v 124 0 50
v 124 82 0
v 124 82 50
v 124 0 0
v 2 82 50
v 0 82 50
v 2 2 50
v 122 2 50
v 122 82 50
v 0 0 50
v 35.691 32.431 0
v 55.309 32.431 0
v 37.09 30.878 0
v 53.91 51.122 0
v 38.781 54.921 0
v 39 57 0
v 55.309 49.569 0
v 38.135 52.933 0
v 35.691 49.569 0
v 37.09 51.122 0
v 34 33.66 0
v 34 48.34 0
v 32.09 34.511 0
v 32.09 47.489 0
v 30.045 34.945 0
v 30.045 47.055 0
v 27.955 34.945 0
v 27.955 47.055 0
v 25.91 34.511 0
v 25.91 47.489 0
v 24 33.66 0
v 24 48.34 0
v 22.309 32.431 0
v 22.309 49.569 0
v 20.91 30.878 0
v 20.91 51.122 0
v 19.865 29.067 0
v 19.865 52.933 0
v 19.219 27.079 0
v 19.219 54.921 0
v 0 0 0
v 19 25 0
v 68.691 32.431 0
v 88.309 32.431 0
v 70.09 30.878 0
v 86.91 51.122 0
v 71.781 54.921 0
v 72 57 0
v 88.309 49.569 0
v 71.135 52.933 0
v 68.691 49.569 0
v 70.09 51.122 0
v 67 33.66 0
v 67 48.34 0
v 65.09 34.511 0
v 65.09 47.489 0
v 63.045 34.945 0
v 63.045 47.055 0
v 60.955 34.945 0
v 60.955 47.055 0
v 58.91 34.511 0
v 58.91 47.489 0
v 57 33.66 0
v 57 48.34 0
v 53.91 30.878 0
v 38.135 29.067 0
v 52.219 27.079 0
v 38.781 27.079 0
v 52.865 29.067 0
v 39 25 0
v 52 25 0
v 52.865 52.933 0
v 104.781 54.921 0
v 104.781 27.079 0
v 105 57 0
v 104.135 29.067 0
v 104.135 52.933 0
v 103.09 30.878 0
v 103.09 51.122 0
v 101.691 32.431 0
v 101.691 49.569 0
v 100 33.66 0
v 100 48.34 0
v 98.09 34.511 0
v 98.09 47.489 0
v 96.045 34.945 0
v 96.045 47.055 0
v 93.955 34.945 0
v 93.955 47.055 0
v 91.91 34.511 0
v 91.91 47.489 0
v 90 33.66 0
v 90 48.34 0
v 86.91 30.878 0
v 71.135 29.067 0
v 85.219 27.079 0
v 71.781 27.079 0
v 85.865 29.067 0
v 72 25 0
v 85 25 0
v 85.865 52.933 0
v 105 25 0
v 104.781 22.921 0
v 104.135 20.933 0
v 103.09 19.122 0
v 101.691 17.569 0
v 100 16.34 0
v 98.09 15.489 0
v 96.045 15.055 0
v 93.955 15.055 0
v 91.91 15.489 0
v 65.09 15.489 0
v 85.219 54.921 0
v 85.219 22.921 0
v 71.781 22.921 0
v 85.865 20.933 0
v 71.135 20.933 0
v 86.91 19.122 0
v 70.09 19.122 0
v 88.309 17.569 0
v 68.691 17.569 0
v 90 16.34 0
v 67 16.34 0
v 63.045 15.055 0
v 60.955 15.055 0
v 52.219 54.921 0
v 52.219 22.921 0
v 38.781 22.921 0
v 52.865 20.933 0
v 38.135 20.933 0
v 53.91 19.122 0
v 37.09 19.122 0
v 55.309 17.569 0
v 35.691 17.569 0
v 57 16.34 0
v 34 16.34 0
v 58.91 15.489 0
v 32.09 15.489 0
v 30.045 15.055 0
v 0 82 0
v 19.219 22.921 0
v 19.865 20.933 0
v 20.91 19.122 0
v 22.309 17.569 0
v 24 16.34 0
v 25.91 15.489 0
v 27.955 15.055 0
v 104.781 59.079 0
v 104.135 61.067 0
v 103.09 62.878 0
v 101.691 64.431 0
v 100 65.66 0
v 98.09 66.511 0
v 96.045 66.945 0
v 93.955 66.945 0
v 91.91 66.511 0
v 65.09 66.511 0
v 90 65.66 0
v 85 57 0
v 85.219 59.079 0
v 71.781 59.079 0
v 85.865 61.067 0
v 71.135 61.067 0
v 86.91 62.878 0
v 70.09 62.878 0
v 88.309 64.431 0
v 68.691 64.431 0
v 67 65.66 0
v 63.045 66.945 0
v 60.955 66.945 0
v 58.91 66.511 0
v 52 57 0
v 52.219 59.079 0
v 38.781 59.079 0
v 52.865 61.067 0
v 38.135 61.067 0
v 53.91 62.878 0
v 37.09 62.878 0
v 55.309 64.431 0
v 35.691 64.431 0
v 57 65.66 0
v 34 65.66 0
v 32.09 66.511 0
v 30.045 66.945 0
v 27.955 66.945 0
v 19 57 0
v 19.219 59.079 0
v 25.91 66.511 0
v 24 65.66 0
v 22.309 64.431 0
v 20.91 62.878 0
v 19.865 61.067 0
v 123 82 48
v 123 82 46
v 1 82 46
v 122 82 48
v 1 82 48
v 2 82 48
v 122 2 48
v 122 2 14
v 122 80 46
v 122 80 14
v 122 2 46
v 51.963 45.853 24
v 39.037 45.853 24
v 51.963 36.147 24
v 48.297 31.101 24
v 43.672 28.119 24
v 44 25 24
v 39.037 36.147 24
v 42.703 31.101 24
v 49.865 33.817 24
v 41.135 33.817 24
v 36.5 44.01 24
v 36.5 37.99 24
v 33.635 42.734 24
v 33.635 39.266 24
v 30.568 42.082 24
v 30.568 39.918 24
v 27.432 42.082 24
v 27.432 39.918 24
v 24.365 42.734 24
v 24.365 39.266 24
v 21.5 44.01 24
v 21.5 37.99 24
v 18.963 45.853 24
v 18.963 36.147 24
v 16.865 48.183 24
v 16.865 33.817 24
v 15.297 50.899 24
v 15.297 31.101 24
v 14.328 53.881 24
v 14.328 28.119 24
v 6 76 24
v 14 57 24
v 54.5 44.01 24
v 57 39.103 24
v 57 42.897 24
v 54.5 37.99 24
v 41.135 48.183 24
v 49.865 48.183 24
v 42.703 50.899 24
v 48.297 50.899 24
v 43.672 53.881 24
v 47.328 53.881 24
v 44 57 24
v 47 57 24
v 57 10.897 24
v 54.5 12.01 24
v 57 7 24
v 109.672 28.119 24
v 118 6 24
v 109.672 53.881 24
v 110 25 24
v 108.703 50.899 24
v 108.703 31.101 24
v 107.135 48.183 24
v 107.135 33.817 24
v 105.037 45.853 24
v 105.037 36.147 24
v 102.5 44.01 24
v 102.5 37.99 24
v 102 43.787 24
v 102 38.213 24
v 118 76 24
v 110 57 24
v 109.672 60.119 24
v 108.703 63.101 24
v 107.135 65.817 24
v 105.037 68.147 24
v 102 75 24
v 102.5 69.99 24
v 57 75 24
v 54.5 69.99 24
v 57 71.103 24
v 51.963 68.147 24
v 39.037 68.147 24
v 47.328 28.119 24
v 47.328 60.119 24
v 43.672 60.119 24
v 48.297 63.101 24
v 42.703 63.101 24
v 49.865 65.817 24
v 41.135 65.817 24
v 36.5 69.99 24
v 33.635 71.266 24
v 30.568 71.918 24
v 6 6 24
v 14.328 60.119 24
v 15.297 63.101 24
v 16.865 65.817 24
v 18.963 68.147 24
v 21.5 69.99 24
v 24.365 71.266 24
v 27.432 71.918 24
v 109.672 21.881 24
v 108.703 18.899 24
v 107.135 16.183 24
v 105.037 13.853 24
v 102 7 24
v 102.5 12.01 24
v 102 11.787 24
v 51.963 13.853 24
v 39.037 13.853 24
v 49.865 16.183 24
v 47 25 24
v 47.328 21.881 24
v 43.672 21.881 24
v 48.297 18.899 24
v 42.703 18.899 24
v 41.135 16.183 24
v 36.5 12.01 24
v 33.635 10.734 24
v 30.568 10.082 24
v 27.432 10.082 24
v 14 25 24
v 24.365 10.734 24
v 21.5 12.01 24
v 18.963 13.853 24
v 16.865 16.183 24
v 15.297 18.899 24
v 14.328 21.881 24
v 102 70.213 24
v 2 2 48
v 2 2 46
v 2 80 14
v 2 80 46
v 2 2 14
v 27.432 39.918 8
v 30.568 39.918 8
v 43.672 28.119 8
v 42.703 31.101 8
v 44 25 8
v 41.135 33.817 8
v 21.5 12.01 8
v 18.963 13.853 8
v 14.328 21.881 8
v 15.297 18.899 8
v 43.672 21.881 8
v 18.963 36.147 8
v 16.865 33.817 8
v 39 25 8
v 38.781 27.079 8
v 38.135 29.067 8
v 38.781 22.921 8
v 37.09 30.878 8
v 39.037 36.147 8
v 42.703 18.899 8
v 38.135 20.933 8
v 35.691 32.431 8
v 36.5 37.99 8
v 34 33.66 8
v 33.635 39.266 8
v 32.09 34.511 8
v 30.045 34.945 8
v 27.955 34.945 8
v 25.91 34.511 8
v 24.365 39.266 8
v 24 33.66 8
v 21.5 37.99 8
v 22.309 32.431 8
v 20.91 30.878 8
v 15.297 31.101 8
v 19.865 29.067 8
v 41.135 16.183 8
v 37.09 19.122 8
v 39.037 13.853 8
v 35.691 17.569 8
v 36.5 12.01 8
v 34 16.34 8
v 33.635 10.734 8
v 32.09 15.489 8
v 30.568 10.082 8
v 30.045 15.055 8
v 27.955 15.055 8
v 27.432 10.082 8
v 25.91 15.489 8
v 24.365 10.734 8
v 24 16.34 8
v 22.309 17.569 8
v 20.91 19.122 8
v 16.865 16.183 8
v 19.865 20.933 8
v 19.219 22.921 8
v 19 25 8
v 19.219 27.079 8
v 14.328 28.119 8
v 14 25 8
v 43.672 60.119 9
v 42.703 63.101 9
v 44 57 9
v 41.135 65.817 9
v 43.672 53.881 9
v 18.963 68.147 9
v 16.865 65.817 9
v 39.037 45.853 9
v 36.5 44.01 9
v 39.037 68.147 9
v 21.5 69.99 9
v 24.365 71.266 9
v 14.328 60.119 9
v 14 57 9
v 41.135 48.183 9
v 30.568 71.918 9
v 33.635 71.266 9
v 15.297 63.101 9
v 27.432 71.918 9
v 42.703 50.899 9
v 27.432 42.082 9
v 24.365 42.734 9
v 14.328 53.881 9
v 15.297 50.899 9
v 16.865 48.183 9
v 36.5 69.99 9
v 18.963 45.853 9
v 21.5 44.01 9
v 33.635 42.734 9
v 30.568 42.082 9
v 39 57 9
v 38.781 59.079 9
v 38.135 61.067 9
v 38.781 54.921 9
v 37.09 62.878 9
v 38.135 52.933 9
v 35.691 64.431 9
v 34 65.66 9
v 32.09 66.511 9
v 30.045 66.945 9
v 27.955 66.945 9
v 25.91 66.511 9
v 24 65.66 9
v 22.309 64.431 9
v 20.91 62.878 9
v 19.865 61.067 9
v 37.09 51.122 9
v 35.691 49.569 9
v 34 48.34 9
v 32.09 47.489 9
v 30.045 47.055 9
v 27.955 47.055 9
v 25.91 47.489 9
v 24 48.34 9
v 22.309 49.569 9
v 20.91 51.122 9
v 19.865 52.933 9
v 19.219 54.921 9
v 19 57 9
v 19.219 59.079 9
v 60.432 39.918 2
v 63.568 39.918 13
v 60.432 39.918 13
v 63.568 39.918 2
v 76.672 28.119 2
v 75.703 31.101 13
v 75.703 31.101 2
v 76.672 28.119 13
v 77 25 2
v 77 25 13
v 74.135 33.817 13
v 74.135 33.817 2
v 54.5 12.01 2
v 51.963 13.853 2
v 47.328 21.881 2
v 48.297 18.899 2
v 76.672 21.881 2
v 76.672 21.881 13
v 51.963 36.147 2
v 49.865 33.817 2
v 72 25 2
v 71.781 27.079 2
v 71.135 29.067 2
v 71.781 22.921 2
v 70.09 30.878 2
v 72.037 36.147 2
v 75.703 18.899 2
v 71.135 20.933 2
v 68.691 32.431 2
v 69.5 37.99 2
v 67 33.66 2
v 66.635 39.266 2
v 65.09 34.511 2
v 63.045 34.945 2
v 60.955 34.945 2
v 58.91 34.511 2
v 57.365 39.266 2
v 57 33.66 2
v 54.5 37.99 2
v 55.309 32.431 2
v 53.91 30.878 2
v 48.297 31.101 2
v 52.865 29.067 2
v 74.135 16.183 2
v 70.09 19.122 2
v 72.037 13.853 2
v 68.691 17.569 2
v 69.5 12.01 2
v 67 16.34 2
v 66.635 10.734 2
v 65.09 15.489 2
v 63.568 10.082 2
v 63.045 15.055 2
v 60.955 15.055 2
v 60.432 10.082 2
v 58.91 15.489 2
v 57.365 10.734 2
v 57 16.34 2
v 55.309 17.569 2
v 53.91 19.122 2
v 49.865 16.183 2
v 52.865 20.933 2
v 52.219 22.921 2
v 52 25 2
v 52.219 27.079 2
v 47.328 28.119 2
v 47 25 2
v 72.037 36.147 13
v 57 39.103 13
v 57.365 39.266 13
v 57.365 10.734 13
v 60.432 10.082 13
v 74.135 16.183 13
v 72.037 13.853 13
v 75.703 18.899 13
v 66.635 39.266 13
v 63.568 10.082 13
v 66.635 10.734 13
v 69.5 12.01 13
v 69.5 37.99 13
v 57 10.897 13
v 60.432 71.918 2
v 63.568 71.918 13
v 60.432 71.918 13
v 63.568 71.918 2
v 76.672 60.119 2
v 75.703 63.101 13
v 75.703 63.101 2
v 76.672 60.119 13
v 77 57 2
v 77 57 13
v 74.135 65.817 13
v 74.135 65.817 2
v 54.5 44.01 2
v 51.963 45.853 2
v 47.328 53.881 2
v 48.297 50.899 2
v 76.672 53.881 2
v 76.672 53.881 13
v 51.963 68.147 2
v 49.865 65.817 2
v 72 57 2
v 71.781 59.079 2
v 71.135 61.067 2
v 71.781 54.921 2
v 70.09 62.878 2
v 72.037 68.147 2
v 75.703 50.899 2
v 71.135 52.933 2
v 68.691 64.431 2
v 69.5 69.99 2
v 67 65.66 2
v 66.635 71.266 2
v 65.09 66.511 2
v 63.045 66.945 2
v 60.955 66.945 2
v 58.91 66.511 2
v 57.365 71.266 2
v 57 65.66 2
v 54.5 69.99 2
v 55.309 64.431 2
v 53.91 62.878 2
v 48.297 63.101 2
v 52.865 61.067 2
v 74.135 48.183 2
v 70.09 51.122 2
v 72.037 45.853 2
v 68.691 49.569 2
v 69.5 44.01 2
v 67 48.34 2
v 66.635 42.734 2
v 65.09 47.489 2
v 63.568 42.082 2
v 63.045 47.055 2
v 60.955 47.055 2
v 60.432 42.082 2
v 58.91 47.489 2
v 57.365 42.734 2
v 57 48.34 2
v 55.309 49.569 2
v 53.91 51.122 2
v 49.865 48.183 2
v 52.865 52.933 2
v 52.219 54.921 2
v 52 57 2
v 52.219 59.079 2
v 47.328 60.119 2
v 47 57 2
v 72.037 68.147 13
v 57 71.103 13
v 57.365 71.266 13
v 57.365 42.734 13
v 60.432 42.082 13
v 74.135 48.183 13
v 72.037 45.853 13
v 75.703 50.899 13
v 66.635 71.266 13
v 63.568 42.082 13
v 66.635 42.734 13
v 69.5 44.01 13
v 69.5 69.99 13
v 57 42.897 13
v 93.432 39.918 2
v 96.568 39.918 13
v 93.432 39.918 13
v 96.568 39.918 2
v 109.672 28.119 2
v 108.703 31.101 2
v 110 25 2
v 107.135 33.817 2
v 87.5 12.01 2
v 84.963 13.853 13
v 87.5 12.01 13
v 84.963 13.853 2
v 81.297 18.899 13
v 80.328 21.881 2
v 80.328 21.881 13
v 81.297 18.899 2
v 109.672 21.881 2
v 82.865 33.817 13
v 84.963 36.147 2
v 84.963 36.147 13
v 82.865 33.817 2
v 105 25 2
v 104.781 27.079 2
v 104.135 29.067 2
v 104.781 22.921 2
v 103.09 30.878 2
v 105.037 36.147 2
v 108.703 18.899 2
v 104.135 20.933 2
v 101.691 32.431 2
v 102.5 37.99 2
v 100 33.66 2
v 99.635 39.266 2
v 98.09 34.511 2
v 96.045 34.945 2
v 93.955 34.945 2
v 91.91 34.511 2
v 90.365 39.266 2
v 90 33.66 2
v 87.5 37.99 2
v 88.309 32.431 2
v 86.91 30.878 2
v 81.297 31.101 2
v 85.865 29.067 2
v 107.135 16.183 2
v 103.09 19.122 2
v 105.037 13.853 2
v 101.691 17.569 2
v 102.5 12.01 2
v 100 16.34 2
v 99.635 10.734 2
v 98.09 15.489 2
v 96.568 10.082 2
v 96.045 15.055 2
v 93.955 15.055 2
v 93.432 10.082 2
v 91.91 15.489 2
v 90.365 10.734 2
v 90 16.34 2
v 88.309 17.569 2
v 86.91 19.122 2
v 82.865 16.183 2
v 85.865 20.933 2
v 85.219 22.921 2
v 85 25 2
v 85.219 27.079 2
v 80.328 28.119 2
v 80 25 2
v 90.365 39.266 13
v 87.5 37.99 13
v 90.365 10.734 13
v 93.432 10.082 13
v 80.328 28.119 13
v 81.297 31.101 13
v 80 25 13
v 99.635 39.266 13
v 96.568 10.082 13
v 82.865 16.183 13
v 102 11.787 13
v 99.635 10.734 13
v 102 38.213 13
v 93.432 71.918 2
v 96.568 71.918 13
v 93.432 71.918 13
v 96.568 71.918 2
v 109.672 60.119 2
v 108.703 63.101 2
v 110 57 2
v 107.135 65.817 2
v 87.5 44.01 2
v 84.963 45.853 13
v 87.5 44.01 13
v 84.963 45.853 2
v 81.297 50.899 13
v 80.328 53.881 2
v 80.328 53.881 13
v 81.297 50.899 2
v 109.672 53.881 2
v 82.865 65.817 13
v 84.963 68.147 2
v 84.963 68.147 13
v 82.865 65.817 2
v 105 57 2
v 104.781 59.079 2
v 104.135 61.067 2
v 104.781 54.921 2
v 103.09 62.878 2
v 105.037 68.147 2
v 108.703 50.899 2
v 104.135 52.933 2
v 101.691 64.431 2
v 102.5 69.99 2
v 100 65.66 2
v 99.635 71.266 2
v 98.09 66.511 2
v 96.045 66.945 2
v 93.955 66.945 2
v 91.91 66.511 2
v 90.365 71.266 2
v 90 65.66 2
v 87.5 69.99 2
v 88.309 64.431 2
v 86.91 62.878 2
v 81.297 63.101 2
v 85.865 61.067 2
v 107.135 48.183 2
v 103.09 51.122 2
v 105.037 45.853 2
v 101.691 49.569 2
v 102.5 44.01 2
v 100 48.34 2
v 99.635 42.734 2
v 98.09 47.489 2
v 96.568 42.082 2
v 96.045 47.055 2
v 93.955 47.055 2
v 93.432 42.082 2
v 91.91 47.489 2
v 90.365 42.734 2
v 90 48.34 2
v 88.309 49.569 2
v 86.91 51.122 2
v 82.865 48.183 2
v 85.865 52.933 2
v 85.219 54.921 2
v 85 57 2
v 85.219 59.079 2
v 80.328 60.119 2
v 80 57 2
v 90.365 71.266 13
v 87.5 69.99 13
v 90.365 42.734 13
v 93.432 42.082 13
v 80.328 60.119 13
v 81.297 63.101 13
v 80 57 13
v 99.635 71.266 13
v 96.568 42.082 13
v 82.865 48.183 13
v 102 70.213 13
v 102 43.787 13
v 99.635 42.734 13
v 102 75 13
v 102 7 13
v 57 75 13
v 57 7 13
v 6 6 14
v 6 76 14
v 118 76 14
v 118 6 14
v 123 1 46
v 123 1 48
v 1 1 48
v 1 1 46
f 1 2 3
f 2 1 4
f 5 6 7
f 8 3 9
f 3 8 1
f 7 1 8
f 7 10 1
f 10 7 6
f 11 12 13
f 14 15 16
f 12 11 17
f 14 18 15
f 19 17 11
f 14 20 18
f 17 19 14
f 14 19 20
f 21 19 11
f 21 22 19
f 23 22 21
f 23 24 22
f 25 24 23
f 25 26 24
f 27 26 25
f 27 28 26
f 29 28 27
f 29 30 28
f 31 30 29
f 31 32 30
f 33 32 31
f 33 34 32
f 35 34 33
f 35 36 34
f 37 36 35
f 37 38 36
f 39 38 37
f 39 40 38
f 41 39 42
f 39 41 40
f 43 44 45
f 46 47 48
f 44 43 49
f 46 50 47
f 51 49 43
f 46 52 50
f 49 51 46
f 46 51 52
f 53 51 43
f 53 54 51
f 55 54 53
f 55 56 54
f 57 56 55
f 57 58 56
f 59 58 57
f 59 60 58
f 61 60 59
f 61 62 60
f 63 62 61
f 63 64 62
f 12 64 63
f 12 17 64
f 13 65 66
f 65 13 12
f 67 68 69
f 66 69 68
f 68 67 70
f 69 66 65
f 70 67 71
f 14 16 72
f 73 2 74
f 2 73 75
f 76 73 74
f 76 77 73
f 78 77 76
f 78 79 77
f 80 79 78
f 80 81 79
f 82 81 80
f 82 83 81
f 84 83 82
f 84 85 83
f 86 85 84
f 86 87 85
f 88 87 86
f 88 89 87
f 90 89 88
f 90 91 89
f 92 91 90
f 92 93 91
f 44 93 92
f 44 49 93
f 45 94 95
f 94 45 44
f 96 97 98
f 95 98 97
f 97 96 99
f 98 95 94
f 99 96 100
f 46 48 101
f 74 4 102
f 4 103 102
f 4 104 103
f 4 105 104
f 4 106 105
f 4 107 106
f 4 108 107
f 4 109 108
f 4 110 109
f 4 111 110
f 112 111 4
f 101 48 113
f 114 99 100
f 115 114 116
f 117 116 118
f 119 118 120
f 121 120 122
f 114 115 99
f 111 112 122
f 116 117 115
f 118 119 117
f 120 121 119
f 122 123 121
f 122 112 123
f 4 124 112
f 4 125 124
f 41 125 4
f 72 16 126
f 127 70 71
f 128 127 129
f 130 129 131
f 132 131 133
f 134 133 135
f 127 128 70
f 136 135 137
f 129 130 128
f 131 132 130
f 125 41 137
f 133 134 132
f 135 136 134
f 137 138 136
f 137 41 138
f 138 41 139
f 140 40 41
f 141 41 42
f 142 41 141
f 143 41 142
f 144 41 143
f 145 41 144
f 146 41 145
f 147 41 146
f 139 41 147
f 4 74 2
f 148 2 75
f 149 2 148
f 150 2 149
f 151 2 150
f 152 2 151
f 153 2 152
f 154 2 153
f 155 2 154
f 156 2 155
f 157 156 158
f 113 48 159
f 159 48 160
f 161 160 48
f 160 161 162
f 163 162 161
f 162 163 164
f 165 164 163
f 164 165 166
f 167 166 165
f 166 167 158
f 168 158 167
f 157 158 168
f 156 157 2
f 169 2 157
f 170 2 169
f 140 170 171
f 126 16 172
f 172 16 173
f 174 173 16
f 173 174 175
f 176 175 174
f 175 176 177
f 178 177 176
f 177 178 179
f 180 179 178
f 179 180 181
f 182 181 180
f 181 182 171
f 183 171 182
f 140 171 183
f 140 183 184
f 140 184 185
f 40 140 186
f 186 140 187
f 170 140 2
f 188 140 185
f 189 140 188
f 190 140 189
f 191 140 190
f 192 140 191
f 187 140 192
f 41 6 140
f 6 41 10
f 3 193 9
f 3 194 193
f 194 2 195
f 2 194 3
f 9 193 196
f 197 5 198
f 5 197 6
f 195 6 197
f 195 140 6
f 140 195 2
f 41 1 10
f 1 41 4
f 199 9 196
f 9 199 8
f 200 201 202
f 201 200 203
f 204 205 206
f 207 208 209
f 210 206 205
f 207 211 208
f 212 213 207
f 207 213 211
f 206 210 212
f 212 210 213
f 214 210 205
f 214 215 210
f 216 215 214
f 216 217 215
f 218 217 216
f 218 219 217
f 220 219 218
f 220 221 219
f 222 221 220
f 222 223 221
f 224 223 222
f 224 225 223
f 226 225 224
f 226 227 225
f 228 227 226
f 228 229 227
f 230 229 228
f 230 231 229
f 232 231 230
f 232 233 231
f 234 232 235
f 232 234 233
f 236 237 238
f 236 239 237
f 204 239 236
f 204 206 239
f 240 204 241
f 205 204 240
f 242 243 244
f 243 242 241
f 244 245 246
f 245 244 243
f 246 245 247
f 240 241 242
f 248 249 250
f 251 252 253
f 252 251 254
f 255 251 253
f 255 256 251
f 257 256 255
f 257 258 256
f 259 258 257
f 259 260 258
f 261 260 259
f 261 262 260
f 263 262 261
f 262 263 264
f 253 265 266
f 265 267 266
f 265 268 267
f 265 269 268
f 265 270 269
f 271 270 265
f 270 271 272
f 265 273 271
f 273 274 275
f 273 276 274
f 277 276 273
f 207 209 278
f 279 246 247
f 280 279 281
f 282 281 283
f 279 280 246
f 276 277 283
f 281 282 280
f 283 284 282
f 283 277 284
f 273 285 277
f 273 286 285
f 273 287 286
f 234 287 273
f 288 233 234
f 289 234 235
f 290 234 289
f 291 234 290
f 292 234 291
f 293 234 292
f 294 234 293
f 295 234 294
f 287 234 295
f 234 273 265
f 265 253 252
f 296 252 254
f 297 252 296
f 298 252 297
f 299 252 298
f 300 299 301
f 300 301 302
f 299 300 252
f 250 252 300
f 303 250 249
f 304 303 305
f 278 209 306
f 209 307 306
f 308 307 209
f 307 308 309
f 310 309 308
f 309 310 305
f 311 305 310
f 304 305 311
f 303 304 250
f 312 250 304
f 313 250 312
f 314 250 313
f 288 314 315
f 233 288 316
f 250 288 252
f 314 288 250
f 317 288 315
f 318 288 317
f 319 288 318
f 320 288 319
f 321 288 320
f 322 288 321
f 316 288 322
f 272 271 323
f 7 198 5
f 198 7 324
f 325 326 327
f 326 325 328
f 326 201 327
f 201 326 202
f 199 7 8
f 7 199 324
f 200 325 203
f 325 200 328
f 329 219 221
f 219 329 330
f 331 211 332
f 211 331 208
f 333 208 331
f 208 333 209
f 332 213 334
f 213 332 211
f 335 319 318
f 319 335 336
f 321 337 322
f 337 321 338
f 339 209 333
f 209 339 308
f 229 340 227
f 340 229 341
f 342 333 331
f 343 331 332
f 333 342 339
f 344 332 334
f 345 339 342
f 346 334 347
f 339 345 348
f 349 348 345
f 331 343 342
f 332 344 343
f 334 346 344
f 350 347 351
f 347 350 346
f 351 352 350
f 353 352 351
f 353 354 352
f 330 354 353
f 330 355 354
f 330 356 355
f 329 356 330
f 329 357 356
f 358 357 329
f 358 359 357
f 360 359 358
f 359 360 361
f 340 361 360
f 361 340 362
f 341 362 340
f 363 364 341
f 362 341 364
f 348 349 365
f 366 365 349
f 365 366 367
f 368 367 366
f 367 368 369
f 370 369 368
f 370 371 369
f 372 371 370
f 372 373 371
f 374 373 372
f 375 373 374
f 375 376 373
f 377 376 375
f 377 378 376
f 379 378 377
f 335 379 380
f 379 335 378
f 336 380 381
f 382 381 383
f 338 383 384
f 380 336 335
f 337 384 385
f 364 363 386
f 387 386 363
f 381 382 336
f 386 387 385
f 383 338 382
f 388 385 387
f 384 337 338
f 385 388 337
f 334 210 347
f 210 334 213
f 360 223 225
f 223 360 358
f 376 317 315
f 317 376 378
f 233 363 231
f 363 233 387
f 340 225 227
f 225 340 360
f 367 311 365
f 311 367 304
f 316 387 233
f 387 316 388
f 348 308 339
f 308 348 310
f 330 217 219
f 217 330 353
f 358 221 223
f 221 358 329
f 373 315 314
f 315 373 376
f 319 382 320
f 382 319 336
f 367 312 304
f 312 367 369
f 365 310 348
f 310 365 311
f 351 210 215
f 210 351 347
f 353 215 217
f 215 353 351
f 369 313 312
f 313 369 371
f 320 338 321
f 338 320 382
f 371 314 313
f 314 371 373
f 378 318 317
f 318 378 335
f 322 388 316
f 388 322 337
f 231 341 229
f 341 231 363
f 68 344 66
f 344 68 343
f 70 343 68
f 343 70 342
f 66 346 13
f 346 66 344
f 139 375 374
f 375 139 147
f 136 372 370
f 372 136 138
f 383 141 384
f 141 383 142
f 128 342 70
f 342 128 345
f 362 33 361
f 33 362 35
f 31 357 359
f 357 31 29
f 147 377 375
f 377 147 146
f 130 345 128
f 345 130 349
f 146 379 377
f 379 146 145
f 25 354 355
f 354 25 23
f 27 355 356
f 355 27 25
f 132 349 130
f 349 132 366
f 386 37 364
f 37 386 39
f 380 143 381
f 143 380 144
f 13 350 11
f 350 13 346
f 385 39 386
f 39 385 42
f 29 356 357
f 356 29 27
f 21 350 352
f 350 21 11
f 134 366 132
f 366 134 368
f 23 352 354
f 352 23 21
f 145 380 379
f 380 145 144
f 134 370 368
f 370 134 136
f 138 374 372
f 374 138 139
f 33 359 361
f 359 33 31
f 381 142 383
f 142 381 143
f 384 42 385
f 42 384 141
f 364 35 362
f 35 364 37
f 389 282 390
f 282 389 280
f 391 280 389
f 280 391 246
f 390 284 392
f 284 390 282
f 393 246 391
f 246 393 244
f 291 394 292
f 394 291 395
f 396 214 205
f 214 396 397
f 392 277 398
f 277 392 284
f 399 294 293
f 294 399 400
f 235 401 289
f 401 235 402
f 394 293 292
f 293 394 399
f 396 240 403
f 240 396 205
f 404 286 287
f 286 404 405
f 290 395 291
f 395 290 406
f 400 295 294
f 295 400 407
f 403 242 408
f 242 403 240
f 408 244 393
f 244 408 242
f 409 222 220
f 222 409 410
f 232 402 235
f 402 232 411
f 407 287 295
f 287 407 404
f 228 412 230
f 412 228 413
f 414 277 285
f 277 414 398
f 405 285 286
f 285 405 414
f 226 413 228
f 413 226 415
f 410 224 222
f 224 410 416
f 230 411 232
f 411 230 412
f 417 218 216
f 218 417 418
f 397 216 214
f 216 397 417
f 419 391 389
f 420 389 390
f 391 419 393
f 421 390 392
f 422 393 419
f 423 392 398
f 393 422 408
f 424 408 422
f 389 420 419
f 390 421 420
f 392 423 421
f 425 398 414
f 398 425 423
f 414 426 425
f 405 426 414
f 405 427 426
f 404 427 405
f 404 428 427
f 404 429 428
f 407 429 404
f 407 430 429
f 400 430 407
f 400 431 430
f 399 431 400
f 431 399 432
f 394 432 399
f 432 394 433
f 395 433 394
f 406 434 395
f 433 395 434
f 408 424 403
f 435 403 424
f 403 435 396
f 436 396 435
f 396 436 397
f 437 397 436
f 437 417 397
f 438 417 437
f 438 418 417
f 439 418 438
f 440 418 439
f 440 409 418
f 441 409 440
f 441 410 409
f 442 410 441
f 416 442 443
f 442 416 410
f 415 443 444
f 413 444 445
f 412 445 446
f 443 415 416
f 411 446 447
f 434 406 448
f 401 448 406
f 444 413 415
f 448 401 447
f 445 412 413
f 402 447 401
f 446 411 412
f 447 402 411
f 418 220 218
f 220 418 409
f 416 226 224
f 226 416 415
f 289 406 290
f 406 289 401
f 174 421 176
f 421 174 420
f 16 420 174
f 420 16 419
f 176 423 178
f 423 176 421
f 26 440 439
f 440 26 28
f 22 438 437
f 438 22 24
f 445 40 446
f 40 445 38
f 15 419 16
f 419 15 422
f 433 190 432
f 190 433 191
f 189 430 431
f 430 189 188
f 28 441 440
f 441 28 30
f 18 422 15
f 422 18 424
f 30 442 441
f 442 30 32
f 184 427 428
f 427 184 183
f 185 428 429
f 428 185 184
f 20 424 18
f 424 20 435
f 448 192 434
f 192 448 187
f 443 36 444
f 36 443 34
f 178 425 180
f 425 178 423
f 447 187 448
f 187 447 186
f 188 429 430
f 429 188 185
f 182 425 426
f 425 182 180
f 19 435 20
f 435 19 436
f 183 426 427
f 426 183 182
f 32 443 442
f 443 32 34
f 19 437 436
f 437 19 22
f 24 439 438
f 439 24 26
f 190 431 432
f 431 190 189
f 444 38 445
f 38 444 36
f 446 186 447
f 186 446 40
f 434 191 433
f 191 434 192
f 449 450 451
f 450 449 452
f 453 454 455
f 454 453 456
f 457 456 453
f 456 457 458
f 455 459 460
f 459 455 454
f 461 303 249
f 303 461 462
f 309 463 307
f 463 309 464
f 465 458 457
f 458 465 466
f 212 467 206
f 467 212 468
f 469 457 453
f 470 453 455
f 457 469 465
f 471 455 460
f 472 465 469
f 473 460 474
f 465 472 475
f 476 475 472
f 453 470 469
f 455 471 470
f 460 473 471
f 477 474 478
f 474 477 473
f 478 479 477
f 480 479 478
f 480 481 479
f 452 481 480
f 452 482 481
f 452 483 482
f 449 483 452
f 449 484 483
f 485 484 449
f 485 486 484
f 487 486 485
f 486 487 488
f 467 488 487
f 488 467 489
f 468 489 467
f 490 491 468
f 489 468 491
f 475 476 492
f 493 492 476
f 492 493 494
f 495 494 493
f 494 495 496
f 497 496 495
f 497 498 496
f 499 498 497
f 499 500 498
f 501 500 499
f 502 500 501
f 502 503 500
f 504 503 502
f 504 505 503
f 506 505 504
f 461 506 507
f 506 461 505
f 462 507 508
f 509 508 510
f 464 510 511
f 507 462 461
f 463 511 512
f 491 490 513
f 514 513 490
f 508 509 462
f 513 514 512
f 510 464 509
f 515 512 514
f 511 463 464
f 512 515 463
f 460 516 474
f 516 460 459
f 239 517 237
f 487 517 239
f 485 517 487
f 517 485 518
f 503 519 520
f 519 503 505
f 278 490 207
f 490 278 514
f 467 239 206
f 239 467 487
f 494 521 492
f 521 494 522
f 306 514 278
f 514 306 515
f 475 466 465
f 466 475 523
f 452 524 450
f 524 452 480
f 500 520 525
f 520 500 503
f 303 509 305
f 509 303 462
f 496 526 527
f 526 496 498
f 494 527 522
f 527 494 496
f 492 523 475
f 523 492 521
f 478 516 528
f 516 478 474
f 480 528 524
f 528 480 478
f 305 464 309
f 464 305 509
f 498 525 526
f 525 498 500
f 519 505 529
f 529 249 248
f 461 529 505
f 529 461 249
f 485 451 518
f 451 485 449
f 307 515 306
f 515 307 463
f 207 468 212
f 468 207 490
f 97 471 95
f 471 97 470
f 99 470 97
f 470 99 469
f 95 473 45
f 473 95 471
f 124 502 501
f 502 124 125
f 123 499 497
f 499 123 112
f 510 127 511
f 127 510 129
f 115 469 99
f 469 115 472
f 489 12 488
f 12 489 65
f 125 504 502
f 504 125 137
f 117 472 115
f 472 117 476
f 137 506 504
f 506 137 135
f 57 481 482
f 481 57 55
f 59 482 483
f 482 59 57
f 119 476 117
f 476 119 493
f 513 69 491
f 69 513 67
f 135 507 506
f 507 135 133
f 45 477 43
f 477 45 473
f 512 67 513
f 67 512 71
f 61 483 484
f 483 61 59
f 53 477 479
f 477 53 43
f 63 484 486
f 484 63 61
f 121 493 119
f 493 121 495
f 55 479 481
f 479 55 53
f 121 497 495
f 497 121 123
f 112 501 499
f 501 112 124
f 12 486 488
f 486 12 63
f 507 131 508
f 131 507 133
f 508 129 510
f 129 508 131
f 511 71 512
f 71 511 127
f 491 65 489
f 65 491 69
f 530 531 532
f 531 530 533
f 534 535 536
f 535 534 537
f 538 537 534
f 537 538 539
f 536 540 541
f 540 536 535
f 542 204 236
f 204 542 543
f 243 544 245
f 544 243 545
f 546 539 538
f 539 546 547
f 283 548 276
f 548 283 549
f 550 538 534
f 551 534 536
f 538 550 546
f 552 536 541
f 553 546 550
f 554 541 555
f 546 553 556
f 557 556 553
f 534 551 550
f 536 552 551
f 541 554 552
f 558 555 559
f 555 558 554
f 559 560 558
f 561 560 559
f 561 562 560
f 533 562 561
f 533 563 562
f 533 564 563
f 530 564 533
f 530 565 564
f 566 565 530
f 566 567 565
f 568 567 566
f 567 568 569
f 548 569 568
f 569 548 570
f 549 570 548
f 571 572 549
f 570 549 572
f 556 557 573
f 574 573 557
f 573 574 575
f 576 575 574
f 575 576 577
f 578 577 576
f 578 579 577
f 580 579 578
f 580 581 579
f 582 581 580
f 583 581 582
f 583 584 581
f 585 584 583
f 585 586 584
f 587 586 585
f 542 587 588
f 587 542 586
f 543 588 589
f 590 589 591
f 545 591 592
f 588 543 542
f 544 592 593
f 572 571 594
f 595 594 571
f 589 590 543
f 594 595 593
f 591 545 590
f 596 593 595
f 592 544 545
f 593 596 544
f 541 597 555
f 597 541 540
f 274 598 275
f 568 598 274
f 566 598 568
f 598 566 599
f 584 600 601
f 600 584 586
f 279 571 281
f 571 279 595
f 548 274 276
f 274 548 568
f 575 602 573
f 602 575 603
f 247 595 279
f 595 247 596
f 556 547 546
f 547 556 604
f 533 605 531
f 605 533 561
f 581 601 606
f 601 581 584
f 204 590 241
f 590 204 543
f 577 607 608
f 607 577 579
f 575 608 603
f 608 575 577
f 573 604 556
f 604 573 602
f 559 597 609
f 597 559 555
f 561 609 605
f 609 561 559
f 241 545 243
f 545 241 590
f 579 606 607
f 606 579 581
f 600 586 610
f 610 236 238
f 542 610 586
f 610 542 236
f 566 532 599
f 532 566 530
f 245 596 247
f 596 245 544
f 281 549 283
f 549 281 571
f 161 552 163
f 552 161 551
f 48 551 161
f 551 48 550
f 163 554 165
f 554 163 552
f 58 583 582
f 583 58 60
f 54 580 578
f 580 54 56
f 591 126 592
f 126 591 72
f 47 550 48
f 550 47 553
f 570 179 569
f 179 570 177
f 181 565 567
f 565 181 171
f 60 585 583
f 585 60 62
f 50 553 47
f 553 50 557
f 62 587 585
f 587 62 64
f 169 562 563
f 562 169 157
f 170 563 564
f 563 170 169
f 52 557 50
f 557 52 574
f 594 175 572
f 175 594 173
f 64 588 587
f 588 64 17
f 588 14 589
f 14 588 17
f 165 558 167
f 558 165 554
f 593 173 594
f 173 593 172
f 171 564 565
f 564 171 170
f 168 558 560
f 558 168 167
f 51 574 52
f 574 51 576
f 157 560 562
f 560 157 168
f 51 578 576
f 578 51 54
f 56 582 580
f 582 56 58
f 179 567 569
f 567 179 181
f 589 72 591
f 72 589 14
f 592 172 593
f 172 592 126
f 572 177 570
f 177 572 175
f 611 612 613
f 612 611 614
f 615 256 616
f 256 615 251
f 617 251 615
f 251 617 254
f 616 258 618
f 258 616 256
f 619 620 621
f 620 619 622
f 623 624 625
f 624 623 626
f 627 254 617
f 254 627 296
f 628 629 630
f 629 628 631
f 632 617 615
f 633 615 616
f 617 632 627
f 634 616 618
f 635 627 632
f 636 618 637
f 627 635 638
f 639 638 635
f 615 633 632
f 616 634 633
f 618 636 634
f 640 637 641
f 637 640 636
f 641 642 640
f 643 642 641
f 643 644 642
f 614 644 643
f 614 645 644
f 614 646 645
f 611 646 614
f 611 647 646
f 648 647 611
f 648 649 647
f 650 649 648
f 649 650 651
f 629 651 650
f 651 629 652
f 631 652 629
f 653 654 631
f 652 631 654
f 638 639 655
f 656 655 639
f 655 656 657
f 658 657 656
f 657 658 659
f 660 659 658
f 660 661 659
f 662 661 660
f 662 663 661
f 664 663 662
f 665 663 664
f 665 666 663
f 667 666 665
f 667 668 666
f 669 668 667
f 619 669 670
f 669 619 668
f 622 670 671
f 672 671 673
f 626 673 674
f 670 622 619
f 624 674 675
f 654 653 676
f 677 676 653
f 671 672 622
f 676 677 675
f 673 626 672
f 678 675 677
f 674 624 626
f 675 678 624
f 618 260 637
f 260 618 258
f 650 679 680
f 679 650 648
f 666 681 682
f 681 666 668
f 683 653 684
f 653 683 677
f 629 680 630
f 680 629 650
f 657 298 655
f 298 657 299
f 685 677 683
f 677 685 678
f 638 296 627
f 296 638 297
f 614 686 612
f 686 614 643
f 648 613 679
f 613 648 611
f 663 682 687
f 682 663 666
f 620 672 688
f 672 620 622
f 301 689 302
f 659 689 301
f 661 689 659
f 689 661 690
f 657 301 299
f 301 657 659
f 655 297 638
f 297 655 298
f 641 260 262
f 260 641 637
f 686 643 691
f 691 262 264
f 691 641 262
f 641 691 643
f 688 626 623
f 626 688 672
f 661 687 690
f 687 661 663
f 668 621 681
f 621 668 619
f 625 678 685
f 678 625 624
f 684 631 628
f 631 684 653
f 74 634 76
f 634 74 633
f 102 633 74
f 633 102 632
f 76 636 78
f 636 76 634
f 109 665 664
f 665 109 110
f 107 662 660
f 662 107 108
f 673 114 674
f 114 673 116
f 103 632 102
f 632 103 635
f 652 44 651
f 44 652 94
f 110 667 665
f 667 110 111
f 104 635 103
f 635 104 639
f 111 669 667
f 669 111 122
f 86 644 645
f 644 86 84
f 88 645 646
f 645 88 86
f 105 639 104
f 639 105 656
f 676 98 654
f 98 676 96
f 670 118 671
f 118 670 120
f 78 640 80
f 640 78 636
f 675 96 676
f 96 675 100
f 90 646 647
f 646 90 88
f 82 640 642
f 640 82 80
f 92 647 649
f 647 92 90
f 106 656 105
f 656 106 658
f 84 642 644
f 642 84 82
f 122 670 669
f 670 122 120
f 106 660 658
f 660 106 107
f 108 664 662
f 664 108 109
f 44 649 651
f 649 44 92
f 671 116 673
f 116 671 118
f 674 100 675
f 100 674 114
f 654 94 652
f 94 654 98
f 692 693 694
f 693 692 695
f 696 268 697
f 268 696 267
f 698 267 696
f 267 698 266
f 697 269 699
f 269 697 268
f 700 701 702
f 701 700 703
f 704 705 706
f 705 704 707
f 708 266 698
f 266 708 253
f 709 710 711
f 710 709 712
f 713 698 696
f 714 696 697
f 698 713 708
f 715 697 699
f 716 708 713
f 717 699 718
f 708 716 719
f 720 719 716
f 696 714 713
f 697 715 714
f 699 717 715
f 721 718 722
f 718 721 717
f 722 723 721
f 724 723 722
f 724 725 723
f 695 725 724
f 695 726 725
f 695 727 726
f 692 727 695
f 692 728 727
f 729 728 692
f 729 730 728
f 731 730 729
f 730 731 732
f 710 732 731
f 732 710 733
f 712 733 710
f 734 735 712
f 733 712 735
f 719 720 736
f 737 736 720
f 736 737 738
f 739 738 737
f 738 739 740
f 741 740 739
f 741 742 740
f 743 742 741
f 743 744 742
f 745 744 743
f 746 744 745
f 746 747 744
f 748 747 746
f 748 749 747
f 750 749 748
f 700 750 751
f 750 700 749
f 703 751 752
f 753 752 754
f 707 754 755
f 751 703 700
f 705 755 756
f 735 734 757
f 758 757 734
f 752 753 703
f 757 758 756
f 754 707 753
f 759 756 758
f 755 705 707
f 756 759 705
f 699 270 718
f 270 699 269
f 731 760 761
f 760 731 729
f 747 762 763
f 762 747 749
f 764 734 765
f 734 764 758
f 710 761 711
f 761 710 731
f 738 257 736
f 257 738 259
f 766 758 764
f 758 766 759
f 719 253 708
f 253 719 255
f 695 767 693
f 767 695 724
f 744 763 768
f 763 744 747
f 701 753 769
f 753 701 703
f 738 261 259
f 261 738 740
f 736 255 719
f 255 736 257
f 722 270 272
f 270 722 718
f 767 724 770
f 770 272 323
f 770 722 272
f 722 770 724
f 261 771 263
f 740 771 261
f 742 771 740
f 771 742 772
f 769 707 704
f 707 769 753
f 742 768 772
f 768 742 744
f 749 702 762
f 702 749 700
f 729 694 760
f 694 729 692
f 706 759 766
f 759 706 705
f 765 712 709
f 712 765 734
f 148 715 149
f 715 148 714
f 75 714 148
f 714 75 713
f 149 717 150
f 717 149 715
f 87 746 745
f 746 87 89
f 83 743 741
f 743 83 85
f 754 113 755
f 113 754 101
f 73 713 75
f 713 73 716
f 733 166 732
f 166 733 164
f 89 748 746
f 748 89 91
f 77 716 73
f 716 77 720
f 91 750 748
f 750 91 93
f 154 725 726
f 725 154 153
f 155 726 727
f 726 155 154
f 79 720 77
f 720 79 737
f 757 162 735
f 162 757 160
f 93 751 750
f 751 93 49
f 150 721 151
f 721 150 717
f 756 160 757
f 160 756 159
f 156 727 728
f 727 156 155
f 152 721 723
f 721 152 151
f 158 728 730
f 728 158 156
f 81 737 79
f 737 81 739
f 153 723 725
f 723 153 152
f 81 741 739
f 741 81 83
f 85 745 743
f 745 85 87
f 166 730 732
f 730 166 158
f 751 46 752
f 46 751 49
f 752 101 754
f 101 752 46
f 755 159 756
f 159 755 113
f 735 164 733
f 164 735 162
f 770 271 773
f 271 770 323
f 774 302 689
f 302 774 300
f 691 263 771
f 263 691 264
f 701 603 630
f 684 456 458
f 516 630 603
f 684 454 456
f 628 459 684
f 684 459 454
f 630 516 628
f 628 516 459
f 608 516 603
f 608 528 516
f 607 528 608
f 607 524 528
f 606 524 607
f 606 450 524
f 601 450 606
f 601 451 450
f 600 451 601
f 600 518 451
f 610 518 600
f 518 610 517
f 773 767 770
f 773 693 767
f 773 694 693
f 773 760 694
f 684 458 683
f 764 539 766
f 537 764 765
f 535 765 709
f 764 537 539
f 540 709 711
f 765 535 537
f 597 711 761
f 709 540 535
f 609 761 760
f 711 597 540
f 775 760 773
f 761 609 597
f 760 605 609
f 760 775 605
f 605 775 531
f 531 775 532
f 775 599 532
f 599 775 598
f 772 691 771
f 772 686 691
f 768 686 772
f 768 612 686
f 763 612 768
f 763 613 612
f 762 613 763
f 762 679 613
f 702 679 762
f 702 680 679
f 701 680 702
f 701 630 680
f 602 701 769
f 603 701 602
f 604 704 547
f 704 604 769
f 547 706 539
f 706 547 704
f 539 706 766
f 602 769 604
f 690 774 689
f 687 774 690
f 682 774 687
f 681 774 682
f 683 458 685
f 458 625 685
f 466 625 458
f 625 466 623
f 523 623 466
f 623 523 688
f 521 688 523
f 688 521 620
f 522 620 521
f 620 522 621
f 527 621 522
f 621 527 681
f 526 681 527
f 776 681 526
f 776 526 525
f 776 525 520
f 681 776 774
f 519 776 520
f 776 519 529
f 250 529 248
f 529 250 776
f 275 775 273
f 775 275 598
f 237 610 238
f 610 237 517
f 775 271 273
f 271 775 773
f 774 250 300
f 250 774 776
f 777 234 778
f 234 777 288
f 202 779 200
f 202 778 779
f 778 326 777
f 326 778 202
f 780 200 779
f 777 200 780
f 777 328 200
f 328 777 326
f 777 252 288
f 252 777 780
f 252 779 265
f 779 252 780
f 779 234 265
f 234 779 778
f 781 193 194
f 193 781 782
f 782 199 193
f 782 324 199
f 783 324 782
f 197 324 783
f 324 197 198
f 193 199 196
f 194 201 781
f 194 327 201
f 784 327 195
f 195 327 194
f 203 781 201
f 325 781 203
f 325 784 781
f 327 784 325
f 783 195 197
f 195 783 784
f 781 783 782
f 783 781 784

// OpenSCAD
difference() {
    cube([124,82,50]);
    translate([2,2,24])
        cube([120,78,60]);
    // vp token
    translate([29,25,8])
        cylinder(24,15,15);
    translate([29,25,-1])
        cylinder(24,10,10);
    // heaven 1
    translate([29,57,9])
        cylinder(24,15,15);
    translate([29,57,-1])
        cylinder(24,10,10);
    
    // heaven 2-4
    translate([62,25,2])
        cylinder(24,15,15);
    translate([62,25,-1])
        cylinder(24,10,10);
    translate([62,57,2])
        cylinder(24,15,15);
    translate([62,57,-1])
        cylinder(24,10,10);
    translate([95,25,2])
        cylinder(24,15,15);
    translate([95,25,-1])
        cylinder(24,10,10);
    translate([95,57,2])
        cylinder(24,15,15);
    translate([95,57,-1])
        cylinder(24,10,10);
    
    // feat cards
    translate([57,7,13])
        cube([45,68,15]);
   
    // figure place holder 
    translate([2,2,14])
        #cube([4,78,15]);
    translate([2,2,14])
        #cube([120,4,15]);
    translate([118,2,14])
        #cube([4,78,15]);
    translate([2,76,14])
        #cube([120,4,15]);
        
    // lid space
    translate([1,1,46])
        cube([122,83,2]);
    translate([2,2,46])
        cube([120,84,6]);
}
